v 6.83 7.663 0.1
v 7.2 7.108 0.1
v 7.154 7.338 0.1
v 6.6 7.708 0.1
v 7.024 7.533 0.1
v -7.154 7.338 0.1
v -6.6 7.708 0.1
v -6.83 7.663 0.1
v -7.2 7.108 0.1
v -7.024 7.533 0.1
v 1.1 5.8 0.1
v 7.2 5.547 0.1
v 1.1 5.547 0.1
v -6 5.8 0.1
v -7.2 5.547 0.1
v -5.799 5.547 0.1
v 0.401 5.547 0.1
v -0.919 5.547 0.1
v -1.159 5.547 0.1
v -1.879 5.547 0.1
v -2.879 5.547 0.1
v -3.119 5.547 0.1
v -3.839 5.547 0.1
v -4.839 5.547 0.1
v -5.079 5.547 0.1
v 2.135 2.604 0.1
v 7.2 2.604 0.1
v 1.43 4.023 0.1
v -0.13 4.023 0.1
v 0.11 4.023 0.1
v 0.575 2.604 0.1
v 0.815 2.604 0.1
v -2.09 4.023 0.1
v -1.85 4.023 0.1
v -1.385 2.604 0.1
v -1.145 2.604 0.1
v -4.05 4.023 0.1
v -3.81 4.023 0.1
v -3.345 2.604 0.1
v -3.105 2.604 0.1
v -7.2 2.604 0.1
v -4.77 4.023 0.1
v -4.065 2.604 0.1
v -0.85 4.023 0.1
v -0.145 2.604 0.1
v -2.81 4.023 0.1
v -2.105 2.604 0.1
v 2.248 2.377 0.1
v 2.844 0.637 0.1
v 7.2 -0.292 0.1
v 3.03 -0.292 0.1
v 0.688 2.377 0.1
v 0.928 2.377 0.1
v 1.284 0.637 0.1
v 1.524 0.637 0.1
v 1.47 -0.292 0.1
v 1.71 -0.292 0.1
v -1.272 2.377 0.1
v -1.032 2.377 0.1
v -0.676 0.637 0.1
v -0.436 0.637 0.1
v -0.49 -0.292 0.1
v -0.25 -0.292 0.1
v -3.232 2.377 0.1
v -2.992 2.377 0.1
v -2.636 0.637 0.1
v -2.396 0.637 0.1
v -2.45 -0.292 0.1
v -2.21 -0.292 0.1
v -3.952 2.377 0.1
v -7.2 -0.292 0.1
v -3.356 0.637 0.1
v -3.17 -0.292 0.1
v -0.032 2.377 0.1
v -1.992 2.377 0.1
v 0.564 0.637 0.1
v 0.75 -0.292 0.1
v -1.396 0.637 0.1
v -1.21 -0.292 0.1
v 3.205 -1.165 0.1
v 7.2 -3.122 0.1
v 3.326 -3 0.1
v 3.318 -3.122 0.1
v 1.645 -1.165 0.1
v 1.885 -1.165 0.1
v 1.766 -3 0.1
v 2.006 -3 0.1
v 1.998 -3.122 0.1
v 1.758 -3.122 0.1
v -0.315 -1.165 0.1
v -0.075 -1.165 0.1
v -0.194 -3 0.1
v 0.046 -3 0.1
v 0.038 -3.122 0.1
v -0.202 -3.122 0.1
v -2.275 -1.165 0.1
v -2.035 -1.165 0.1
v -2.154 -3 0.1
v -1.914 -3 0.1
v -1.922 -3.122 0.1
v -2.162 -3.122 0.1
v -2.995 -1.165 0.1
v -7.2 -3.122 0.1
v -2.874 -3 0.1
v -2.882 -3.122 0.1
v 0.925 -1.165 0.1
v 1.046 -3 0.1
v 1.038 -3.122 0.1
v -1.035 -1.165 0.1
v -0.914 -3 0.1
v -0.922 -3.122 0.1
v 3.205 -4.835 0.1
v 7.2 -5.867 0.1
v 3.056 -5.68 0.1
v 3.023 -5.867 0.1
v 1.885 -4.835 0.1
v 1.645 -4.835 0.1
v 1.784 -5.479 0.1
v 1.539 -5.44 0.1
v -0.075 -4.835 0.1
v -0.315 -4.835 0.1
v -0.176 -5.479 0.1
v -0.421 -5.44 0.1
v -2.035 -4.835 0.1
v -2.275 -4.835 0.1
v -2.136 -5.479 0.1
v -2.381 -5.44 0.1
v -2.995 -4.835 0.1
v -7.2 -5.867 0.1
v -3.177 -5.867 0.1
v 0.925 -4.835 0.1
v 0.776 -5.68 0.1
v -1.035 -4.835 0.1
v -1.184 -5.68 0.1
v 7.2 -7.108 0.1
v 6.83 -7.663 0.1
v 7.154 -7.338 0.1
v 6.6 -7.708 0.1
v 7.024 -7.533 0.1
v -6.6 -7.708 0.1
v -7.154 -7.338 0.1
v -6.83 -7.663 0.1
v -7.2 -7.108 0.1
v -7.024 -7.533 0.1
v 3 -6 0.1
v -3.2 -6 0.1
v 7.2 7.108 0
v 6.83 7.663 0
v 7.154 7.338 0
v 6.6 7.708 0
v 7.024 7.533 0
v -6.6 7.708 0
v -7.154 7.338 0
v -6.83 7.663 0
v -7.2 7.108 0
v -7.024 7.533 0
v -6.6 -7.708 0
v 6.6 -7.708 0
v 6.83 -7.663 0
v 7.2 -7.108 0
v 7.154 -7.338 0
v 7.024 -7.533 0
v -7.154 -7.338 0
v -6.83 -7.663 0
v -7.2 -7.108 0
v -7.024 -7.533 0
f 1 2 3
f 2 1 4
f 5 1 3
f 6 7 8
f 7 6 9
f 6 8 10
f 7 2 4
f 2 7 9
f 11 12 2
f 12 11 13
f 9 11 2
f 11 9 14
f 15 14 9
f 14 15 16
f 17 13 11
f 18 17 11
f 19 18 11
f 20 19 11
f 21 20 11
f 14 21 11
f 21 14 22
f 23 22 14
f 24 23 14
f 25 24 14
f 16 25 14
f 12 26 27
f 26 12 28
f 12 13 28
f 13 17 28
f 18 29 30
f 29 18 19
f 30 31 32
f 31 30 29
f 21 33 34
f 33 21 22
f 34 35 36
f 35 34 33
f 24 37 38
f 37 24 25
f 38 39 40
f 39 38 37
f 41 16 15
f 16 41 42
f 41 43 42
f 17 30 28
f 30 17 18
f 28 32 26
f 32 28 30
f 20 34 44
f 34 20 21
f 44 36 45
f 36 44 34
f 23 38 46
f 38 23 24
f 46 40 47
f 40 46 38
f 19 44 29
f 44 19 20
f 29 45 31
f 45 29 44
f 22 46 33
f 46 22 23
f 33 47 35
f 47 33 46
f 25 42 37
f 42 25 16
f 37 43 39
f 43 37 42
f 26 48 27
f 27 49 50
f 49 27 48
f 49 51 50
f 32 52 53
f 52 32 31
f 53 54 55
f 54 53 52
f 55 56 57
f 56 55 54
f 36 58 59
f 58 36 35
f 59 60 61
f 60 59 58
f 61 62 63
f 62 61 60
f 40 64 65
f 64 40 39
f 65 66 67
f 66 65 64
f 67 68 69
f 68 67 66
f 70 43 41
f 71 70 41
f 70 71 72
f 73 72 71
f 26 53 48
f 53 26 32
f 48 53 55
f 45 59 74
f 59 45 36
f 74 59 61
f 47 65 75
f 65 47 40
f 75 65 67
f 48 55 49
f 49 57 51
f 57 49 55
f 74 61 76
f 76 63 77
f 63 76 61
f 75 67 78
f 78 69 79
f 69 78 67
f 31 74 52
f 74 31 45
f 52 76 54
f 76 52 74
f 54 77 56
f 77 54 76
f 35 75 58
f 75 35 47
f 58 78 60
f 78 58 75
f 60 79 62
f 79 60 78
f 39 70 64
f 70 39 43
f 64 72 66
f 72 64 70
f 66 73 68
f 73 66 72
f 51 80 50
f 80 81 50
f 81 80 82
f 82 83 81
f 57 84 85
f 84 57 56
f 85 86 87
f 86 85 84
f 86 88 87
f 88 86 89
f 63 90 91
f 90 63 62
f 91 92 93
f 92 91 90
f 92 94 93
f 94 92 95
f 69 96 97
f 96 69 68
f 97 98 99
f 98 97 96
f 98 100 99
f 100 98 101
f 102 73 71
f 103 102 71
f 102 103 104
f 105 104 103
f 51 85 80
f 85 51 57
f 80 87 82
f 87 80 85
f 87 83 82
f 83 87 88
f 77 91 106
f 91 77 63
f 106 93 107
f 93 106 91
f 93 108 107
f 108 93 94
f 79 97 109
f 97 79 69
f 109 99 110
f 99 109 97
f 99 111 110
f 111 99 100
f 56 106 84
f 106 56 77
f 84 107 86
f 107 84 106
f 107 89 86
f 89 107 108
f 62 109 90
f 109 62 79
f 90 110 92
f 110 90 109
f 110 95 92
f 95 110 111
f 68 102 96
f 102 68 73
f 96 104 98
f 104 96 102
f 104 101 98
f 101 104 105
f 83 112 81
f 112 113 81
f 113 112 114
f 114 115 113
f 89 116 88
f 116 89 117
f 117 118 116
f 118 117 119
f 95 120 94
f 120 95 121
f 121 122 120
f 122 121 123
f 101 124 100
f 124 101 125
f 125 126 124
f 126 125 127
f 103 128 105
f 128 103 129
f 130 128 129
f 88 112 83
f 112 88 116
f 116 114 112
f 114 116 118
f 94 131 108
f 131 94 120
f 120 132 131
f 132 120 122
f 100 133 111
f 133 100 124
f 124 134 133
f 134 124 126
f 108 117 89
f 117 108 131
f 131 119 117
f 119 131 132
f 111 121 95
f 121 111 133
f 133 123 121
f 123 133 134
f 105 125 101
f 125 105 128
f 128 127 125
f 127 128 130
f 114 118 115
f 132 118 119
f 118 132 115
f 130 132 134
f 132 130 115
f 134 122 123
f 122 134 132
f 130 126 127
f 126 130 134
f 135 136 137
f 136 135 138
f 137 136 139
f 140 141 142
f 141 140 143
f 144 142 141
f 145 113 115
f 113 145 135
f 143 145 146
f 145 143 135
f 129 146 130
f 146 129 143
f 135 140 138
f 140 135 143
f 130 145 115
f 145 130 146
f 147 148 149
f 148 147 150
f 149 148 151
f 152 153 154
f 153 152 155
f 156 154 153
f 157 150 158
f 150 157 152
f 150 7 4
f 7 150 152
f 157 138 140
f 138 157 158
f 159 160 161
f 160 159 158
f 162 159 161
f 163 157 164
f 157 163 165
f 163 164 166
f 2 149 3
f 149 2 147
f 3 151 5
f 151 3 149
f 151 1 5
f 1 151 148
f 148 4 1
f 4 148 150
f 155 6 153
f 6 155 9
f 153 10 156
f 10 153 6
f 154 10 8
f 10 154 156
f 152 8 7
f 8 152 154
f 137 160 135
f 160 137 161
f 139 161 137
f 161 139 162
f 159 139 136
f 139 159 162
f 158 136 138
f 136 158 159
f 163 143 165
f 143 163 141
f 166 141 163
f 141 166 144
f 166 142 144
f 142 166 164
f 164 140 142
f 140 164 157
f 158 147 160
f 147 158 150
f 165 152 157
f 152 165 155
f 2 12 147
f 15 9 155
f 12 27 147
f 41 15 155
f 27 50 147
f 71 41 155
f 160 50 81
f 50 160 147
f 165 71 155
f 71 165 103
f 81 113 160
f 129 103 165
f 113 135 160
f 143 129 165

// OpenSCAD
// file: ../p/box3u12.scad
use <../lib.scad>
function ldraw_lib__box3u12() = [
// 0 Box with 3 Parallel Faces without Any Edges
// 0 Name: box3u12.dat
// 0 Author: J.C. Tchang [tchang]
// 0 !LDRAW_ORG Primitive UPDATE 2014-02
// 0 !LICENSE Licensed under CC BY 4.0 : see CAreadme.txt
// 
// 0 BFC CERTIFY CCW
  [0,"BFC","CERTIFY"],
  [0,"BFC","CCW"],
// 
// 0 !HISTORY 2014-12-23 [PTadmin] Official Update 2014-02
// 
// 
// 4 16 -1 1 1 1 1 1 1 1 -1 -1 1 -1
  [4,16,-1,1,1,1,1,1,1,1,-1,-1,1,-1],
// 4 16 -1 1 1 -1 0 1 1 0 1 1 1 1
  [4,16,-1,1,1,-1,0,1,1,0,1,1,1,1],
// 4 16 1 1 -1 1 0 -1 -1 0 -1 -1 1 -1
  [4,16,1,1,-1,1,0,-1,-1,0,-1,-1,1,-1],
];
module ldraw_lib__box3u12(step=0, col=false, unit=2/5, alt=false, line=0.2, solid=!$preview)
    makepoly(ldraw_lib__box3u12(), step=step, col=col, unit=unit, alt=alt, line=line, solid=solid);
ldraw_lib__box3u12(line=0.2);
// file: ../p/1-4cyli.scad
use <../lib.scad>
function ldraw_lib__1_4cyli() = [
// 0 Cylinder 0.25
// 0 Name: 1-4cyli.dat
// 0 Author: James Jessiman
// 0 !LDRAW_ORG Primitive UPDATE 2012-01
// 0 !LICENSE Licensed under CC BY 4.0 : see CAreadme.txt
// 
// 0 BFC CERTIFY CCW
  [0,"BFC","CERTIFY"],
  [0,"BFC","CCW"],
// 
// 0 !HISTORY 2002-03-23 [sbliss] Added BFC statement.
// 0 !HISTORY 2002-04-25 [PTadmin] Official Update 2002-02
// 0 !HISTORY 2007-06-22 [PTadmin] Header formatted for Contributor Agreement
// 0 !HISTORY 2008-07-01 [PTadmin] Official Update 2008-01
// 0 !HISTORY 2012-02-16 [Philo] Changed to CCW
// 0 !HISTORY 2012-03-30 [PTadmin] Official Update 2012-01
// 
// 
// 4 16 1 1 0 0.9239 1 0.3827 0.9239 0 0.3827 1 0 0
  [4,16,1,1,0,0.9239,1,0.3827,0.9239,0,0.3827,1,0,0],
// 5 24 1 0 0 1 1 0 0.9239 0 0.3827 1 0 -1
  [5,24,1,0,0,1,1,0,0.9239,0,0.3827,1,0,-1],
// 4 16 0.9239 1 0.3827 0.7071 1 0.7071 0.7071 0 0.7071 0.9239 0 0.3827
  [4,16,0.9239,1,0.3827,0.7071,1,0.7071,0.7071,0,0.7071,0.9239,0,0.3827],
// 5 24 0.9239 0 0.3827 0.9239 1 0.3827 0.7071 0 0.7071 1 0 0
  [5,24,0.9239,0,0.3827,0.9239,1,0.3827,0.7071,0,0.7071,1,0,0],
// 4 16 0.7071 1 0.7071 0.3827 1 0.9239 0.3827 0 0.9239 0.7071 0 0.7071
  [4,16,0.7071,1,0.7071,0.3827,1,0.9239,0.3827,0,0.9239,0.7071,0,0.7071],
// 5 24 0.7071 0 0.7071 0.7071 1 0.7071 0.3827 0 0.9239 0.9239 0 0.3827
  [5,24,0.7071,0,0.7071,0.7071,1,0.7071,0.3827,0,0.9239,0.9239,0,0.3827],
// 4 16 0.3827 1 0.9239 0 1 1 0 0 1 0.3827 0 0.9239
  [4,16,0.3827,1,0.9239,0,1,1,0,0,1,0.3827,0,0.9239],
// 5 24 0.3827 0 0.9239 0.3827 1 0.9239 0 0 1 0.7071 0 0.7071
  [5,24,0.3827,0,0.9239,0.3827,1,0.9239,0,0,1,0.7071,0,0.7071],
// 5 24 0 0 1 0 1 1 0.3827 0 0.9239 -1 0 1
  [5,24,0,0,1,0,1,1,0.3827,0,0.9239,-1,0,1],
];
module ldraw_lib__1_4cyli(step=0, col=false, unit=2/5, alt=false, line=0.2, solid=!$preview)
    makepoly(ldraw_lib__1_4cyli(), step=step, col=col, unit=unit, alt=alt, line=line, solid=solid);
ldraw_lib__1_4cyli(line=0.2);
// file: ../p/1-4chrd.scad
use <../lib.scad>
function ldraw_lib__1_4chrd() = [
// 0 Chord 0.25
// 0 Name: 1-4chrd.dat
// 0 Author: Max Martin Richter [MMR1988]
// 0 !LDRAW_ORG Primitive UPDATE 2023-05
// 0 !LICENSE Licensed under CC BY 4.0 : see CAreadme.txt
// 
// 0 BFC CERTIFY CCW
  [0,"BFC","CERTIFY"],
  [0,"BFC","CCW"],
// 
// 0 !HISTORY 2004-04-22 [PTadmin] Official Update 2004-02
// 0 !HISTORY 2007-10-09 [PTadmin] Header formatted for Contributor Agreement
// 0 !HISTORY 2008-07-01 [PTadmin] Official Update 2008-01
// 0 !HISTORY 2012-08-02 [MMR1988] Re-creation with PrimGen2 and Rectifier
// 0 !HISTORY 2012-08-09 [PTadmin] Official Update 2012-02
// 0 !HISTORY 2023-10-27 [OrionP] Change author to MMR1988 from hafhead
// 0 !HISTORY 2023-10-31 [OrionP] Official Update 2023-05
// 
// 4 16 0.9239 0 0.3827 0.3827 0 0.9239 0 0 1 1 0 0
  [4,16,0.9239,0,0.3827,0.3827,0,0.9239,0,0,1,1,0,0],
// 3 16 0.7071 0 0.7071 0.3827 0 0.9239 0.9239 0 0.3827
  [3,16,0.7071,0,0.7071,0.3827,0,0.9239,0.9239,0,0.3827],
];
module ldraw_lib__1_4chrd(step=0, col=false, unit=2/5, alt=false, line=0.2, solid=!$preview)
    makepoly(ldraw_lib__1_4chrd(), step=step, col=col, unit=unit, alt=alt, line=line, solid=solid);
ldraw_lib__1_4chrd(line=0.2);
// file: s/6142617ss07.scad
use <../../lib.scad>
use <../../p/1-4chrd.scad>
use <../../p/1-4cyli.scad>
use <../../p/box3u12.scad>
function ldraw_lib__s__6142617ss07() = [
// 0 ~Sticker  1.9 x  1.8 with Silver Air Vents on Black Background Left - Bottom Face
// 0 Name: s\6142617ss07.dat
// 0 Author: Massimo Maso [Sirio]
// 0 !LDRAW_ORG Subpart UPDATE 2023-05
// 0 !LICENSE Licensed under CC BY 4.0 : see CAreadme.txt
// 
// 0 BFC CERTIFY CCW
  [0,"BFC","CERTIFY"],
  [0,"BFC","CCW"],
// 
// 0 !HISTORY 2023-10-31 [OrionP] Official Update 2023-05
// 
// 
// 0 // Primitives
// 1 16 -16.5 0 17.7711 -1.5 0 0 0 -1 0 0 0 1.5 1-4chrd.dat
  [1,16,-16.5,0,17.7711,-1.5,0,0,0,-1,0,0,0,1.5, ldraw_lib__1_4chrd()],
// 1 16 16.5 0 17.7711 1.5 0 0 0 -1 0 0 0 1.5 1-4chrd.dat
  [1,16,16.5,0,17.7711,1.5,0,0,0,-1,0,0,0,1.5, ldraw_lib__1_4chrd()],
// 1 16 0 -.25 0 16.5 0 0 0 .25 0 0 0 19.2711 box3u12.dat
  [1,16,0,-.25,0,16.5,0,0,0,.25,0,0,0,19.2711, ldraw_lib__box3u12()],
// 1 16 -16.5 0 -17.7711 -1.5 0 0 0 -1 0 0 0 -1.5 1-4chrd.dat
  [1,16,-16.5,0,-17.7711,-1.5,0,0,0,-1,0,0,0,-1.5, ldraw_lib__1_4chrd()],
// 1 16 16.5 0 -17.7711 1.5 0 0 0 -1 0 0 0 -1.5 1-4chrd.dat
  [1,16,16.5,0,-17.7711,1.5,0,0,0,-1,0,0,0,-1.5, ldraw_lib__1_4chrd()],
// 1 16 -16.5 -0.25 17.7711 -1.5 0 0 0 0.25 0 0 0 1.5 1-4cyli.dat
  [1,16,-16.5,-0.25,17.7711,-1.5,0,0,0,0.25,0,0,0,1.5, ldraw_lib__1_4cyli()],
// 1 16 16.5 -0.25 17.7711 1.5 0 0 0 0.25 0 0 0 1.5 1-4cyli.dat
  [1,16,16.5,-0.25,17.7711,1.5,0,0,0,0.25,0,0,0,1.5, ldraw_lib__1_4cyli()],
// 1 16 -16.5 -0.25 -17.7711 -1.5 0 0 0 0.25 0 0 0 -1.5 1-4cyli.dat
  [1,16,-16.5,-0.25,-17.7711,-1.5,0,0,0,0.25,0,0,0,-1.5, ldraw_lib__1_4cyli()],
// 1 16 16.5 -0.25 -17.7711 1.5 0 0 0 0.25 0 0 0 -1.5 1-4cyli.dat
  [1,16,16.5,-0.25,-17.7711,1.5,0,0,0,0.25,0,0,0,-1.5, ldraw_lib__1_4cyli()],
// 0 // Bottom face
// 4 16 -16.5 0 19.2711 -16.5 0 -19.2711 -18 0 -17.7711 -18 0 17.7711
  [4,16,-16.5,0,19.2711,-16.5,0,-19.2711,-18,0,-17.7711,-18,0,17.7711],
// 4 16 16.5 0 19.2711 18 0 17.7711 18 0 -17.7711 16.5 0 -19.2711
  [4,16,16.5,0,19.2711,18,0,17.7711,18,0,-17.7711,16.5,0,-19.2711],
// 0 // Lateral face
// 3 16 -18 0 17.7711 -18 -.25 13.8668 -18 -.25 17.7711
  [3,16,-18,0,17.7711,-18,-.25,13.8668,-18,-.25,17.7711],
// 3 16 18 0 17.7711 18 -.25 17.7711 18 -.25 13.8668
  [3,16,18,0,17.7711,18,-.25,17.7711,18,-.25,13.8668],
// 3 16 -18 0 17.7711 -18 -.25 6.5112 -18 -.25 13.8668
  [3,16,-18,0,17.7711,-18,-.25,6.5112,-18,-.25,13.8668],
// 3 16 18 0 17.7711 18 -.25 13.8668 18 -.25 6.5112
  [3,16,18,0,17.7711,18,-.25,13.8668,18,-.25,6.5112],
// 3 16 -18 0 17.7711 -18 -.25 -.73 -18 -.25 6.5112
  [3,16,-18,0,17.7711,-18,-.25,-.73,-18,-.25,6.5112],
// 3 16 18 0 17.7711 18 -.25 6.5112 18 -.25 -.73
  [3,16,18,0,17.7711,18,-.25,6.5112,18,-.25,-.73],
// 4 16 -18 0 17.7711 -18 0 -17.7711 -18 -.25 -7.8038 -18 -.25 -.73
  [4,16,-18,0,17.7711,-18,0,-17.7711,-18,-.25,-7.8038,-18,-.25,-.73],
// 4 16 18 0 17.7711 18 -.25 -.73 18 -.25 -7.8038 18 0 -17.7711
  [4,16,18,0,17.7711,18,-.25,-.73,18,-.25,-7.8038,18,0,-17.7711],
// 3 16 -18 0 -17.7711 -18 -.25 -14.6666 -18 -.25 -7.8038
  [3,16,-18,0,-17.7711,-18,-.25,-14.6666,-18,-.25,-7.8038],
// 3 16 18 0 -17.7711 18 -.25 -7.8038 18 -.25 -14.6666
  [3,16,18,0,-17.7711,18,-.25,-7.8038,18,-.25,-14.6666],
// 3 16 -18 0 -17.7711 -18 -.25 -17.7711 -18 -.25 -14.6666
  [3,16,-18,0,-17.7711,-18,-.25,-17.7711,-18,-.25,-14.6666],
// 3 16 18 0 -17.7711 18 -.25 -14.6666 18 -.25 -17.7711
  [3,16,18,0,-17.7711,18,-.25,-14.6666,18,-.25,-17.7711],
];
module ldraw_lib__s__6142617ss07(step=0, col=false, unit=2/5, alt=false, line=0.2, solid=!$preview)
    makepoly(ldraw_lib__s__6142617ss07(), step=step, col=col, unit=unit, alt=alt, line=line, solid=solid);
ldraw_lib__s__6142617ss07(line=0.2);
// file: s/6142617ss06.scad
use <../../lib.scad>
use <../../p/1-4chrd.scad>
function ldraw_lib__s__6142617ss06() = [
// 0 ~Sticker  1.9 x  1.8 with Silver Air Vents on Black Background Left - Sixth Face
// 0 Name: s\6142617ss06.dat
// 0 Author: Massimo Maso [Sirio]
// 0 !LDRAW_ORG Subpart UPDATE 2023-05
// 0 !LICENSE Licensed under CC BY 4.0 : see CAreadme.txt
// 
// 0 BFC CERTIFY CCW
  [0,"BFC","CERTIFY"],
  [0,"BFC","CCW"],
// 
// 0 !HISTORY 2023-10-31 [OrionP] Official Update 2023-05
// 
// 
// 0 // Primitives
// 1 0 -16.5 -.25 -3.0901 -1.5 0 0 0 1 0 0 0 -1.5 1-4chrd.dat
  [1,0,-16.5,-.25,-3.0901,-1.5,0,0,0,1,0,0,0,-1.5, ldraw_lib__1_4chrd()],
// 1 0 16.5 -.25 -3.0901 1.5 0 0 0 1 0 0 0 -1.5 1-4chrd.dat
  [1,0,16.5,-.25,-3.0901,1.5,0,0,0,1,0,0,0,-1.5, ldraw_lib__1_4chrd()],
// 0 // Black faces
// 4 0 -18 -.25 -3.0901 -7.5 -.25 -.319 -7.5587 -.25 .0144 -18 -.25 .0144
  [4,0,-18,-.25,-3.0901,-7.5,-.25,-.319,-7.5587,-.25,.0144,-18,-.25,.0144],
// 4 0 -18 -.25 -3.0901 18 -.25 -3.0901 8 -.25 -.319 -7.5 -.25 -.319
  [4,0,-18,-.25,-3.0901,18,-.25,-3.0901,8,-.25,-.319,-7.5,-.25,-.319],
// 4 0 18 -.25 -3.0901 18 -.25 .0144 7.9413 -.25 .0144 8 -.25 -.319
  [4,0,18,-.25,-3.0901,18,-.25,.0144,7.9413,-.25,.0144,8,-.25,-.319],
// 4 0 18 -.25 -3.0901 -18 -.25 -3.0901 -16.5 -.25 -4.5901 16.5 -.25 -4.5901
  [4,0,18,-.25,-3.0901,-18,-.25,-3.0901,-16.5,-.25,-4.5901,16.5,-.25,-4.5901],
// 0 // Silver face
// 4 80 -7.5587 -.25 .0144 -7.5 -.25 -.319 8 -.25 -.319 7.9413 -.25 .0144
  [4,80,-7.5587,-.25,.0144,-7.5,-.25,-.319,8,-.25,-.319,7.9413,-.25,.0144],
];
module ldraw_lib__s__6142617ss06(step=0, col=false, unit=2/5, alt=false, line=0.2, solid=!$preview)
    makepoly(ldraw_lib__s__6142617ss06(), step=step, col=col, unit=unit, alt=alt, line=line, solid=solid);
ldraw_lib__s__6142617ss06(line=0.2);
// file: s/6142617ss05.scad
use <../../lib.scad>
function ldraw_lib__s__6142617ss05() = [
// 0 ~Sticker  1.9 x  1.8 with Silver Air Vents on Black Background Left - Fifth Face
// 0 Name: s\6142617ss05.dat
// 0 Author: Massimo Maso [Sirio]
// 0 !LDRAW_ORG Subpart UPDATE 2023-05
// 0 !LICENSE Licensed under CC BY 4.0 : see CAreadme.txt
// 
// 0 BFC CERTIFY CCW
  [0,"BFC","CERTIFY"],
  [0,"BFC","CCW"],
// 
// 0 !HISTORY 2023-10-31 [OrionP] Official Update 2023-05
// 
// 
// 0 // Black faces
// 3 0 -18 -.25 6.8484 -8.0132 -.25 2.5659 -8.2961 -.25 6.8484
  [3,0,-18,-.25,6.8484,-8.0132,-.25,2.5659,-8.2961,-.25,6.8484],
// 4 0 -18 -.25 6.8484 -18 -.25 -.0144 -7.6409 -.25 .4522 -8.0132 -.25 2.5659
  [4,0,-18,-.25,6.8484,-18,-.25,-.0144,-7.6409,-.25,.4522,-8.0132,-.25,2.5659],
// 3 0 -18 -.25 -.0144 -7.5587 -.25 -.0144 -7.6409 -.25 .4522
  [3,0,-18,-.25,-.0144,-7.5587,-.25,-.0144,-7.6409,-.25,.4522],
// 4 0 -4.7132 -.25 2.5659 -4.1132 -.25 2.5659 -4.3961 -.25 6.8484 -4.9961 -.25 6.8484
  [4,0,-4.7132,-.25,2.5659,-4.1132,-.25,2.5659,-4.3961,-.25,6.8484,-4.9961,-.25,6.8484],
// 4 0 -4.7132 -.25 2.5659 -4.461 -.25 .955 -3.8466 -.25 1.0522 -4.1132 -.25 2.5659
  [4,0,-4.7132,-.25,2.5659,-4.461,-.25,.955,-3.8466,-.25,1.0522,-4.1132,-.25,2.5659],
// 4 0 .1868 -.25 2.5659 .7868 -.25 2.5659 .5039 -.25 6.8484 -.0961 -.25 6.8484
  [4,0,.1868,-.25,2.5659,.7868,-.25,2.5659,.5039,-.25,6.8484,-.0961,-.25,6.8484],
// 4 0 .1868 -.25 2.5659 .439 -.25 .955 1.0534 -.25 1.0522 .7868 -.25 2.5659
  [4,0,.1868,-.25,2.5659,.439,-.25,.955,1.0534,-.25,1.0522,.7868,-.25,2.5659],
// 4 0 5.0868 -.25 2.5659 5.6868 -.25 2.5659 5.4039 -.25 6.8484 4.8039 -.25 6.8484
  [4,0,5.0868,-.25,2.5659,5.6868,-.25,2.5659,5.4039,-.25,6.8484,4.8039,-.25,6.8484],
// 4 0 5.0868 -.25 2.5659 5.339 -.25 .955 5.9534 -.25 1.0522 5.6868 -.25 2.5659
  [4,0,5.0868,-.25,2.5659,5.339,-.25,.955,5.9534,-.25,1.0522,5.6868,-.25,2.5659],
// 4 0 18 -.25 -.0144 18 -.25 6.8484 7.2039 -.25 6.8484 7.4868 -.25 2.5659
  [4,0,18,-.25,-.0144,18,-.25,6.8484,7.2039,-.25,6.8484,7.4868,-.25,2.5659],
// 3 0 18 -.25 -.0144 7.4868 -.25 2.5659 7.9413 -.25 -.0144
  [3,0,18,-.25,-.0144,7.4868,-.25,2.5659,7.9413,-.25,-.0144],
// 0 // Grey faces
// 4 71 -8.0132 -.25 2.5659 -4.7132 -.25 2.5659 -4.9961 -.25 6.8484 -8.2961 -.25 6.8484
  [4,71,-8.0132,-.25,2.5659,-4.7132,-.25,2.5659,-4.9961,-.25,6.8484,-8.2961,-.25,6.8484],
// 4 71 -8.0132 -.25 2.5659 -7.6409 -.25 .4522 -4.461 -.25 .955 -4.7132 -.25 2.5659
  [4,71,-8.0132,-.25,2.5659,-7.6409,-.25,.4522,-4.461,-.25,.955,-4.7132,-.25,2.5659],
// 4 71 -2.3132 -.25 2.5659 .1868 -.25 2.5659 -.0961 -.25 6.8484 -2.5961 -.25 6.8484
  [4,71,-2.3132,-.25,2.5659,.1868,-.25,2.5659,-.0961,-.25,6.8484,-2.5961,-.25,6.8484],
// 4 71 -2.3132 -.25 2.5659 -1.9409 -.25 .4522 .439 -.25 .955 .1868 -.25 2.5659
  [4,71,-2.3132,-.25,2.5659,-1.9409,-.25,.4522,.439,-.25,.955,.1868,-.25,2.5659],
// 4 71 2.5868 -.25 2.5659 5.0868 -.25 2.5659 4.8039 -.25 6.8484 2.3039 -.25 6.8484
  [4,71,2.5868,-.25,2.5659,5.0868,-.25,2.5659,4.8039,-.25,6.8484,2.3039,-.25,6.8484],
// 4 71 2.5868 -.25 2.5659 2.9591 -.25 .4522 5.339 -.25 .955 5.0868 -.25 2.5659
  [4,71,2.5868,-.25,2.5659,2.9591,-.25,.4522,5.339,-.25,.955,5.0868,-.25,2.5659],
// 0 // Silver faces
// 4 80 -4.1132 -.25 2.5659 -2.3132 -.25 2.5659 -2.5961 -.25 6.8484 -4.3961 -.25 6.8484
  [4,80,-4.1132,-.25,2.5659,-2.3132,-.25,2.5659,-2.5961,-.25,6.8484,-4.3961,-.25,6.8484],
// 4 80 -4.1132 -.25 2.5659 -3.8466 -.25 1.0522 -1.9409 -.25 .4522 -2.3132 -.25 2.5659
  [4,80,-4.1132,-.25,2.5659,-3.8466,-.25,1.0522,-1.9409,-.25,.4522,-2.3132,-.25,2.5659],
// 4 80 .7868 -.25 2.5659 2.5868 -.25 2.5659 2.3039 -.25 6.8484 .5039 -.25 6.8484
  [4,80,.7868,-.25,2.5659,2.5868,-.25,2.5659,2.3039,-.25,6.8484,.5039,-.25,6.8484],
// 4 80 .7868 -.25 2.5659 1.0534 -.25 1.0522 2.9591 -.25 .4522 2.5868 -.25 2.5659
  [4,80,.7868,-.25,2.5659,1.0534,-.25,1.0522,2.9591,-.25,.4522,2.5868,-.25,2.5659],
// 4 80 5.6868 -.25 2.5659 7.4868 -.25 2.5659 7.2039 -.25 6.8484 5.4039 -.25 6.8484
  [4,80,5.6868,-.25,2.5659,7.4868,-.25,2.5659,7.2039,-.25,6.8484,5.4039,-.25,6.8484],
// 4 80 5.6868 -.25 2.5659 5.9534 -.25 1.0522 7.9413 -.25 -.0144 7.4868 -.25 2.5659
  [4,80,5.6868,-.25,2.5659,5.9534,-.25,1.0522,7.9413,-.25,-.0144,7.4868,-.25,2.5659],
// 3 80 -7.5587 -.25 -.0144 -4.461 -.25 .955 -7.6409 -.25 .4522
  [3,80,-7.5587,-.25,-.0144,-4.461,-.25,.955,-7.6409,-.25,.4522],
// 4 80 -7.5587 -.25 -.0144 -1.9409 -.25 .4522 -3.8466 -.25 1.0522 -4.461 -.25 .955
  [4,80,-7.5587,-.25,-.0144,-1.9409,-.25,.4522,-3.8466,-.25,1.0522,-4.461,-.25,.955],
// 4 80 -7.5587 -.25 -.0144 7.9413 -.25 -.0144 2.9591 -.25 .4522 -1.9409 -.25 .4522
  [4,80,-7.5587,-.25,-.0144,7.9413,-.25,-.0144,2.9591,-.25,.4522,-1.9409,-.25,.4522],
// 4 80 2.9591 -.25 .4522 1.0534 -.25 1.0522 .439 -.25 .955 -1.9409 -.25 .4522
  [4,80,2.9591,-.25,.4522,1.0534,-.25,1.0522,.439,-.25,.955,-1.9409,-.25,.4522],
// 4 80 2.9591 -.25 .4522 7.9413 -.25 -.0144 5.9534 -.25 1.0522 5.339 -.25 .955
  [4,80,2.9591,-.25,.4522,7.9413,-.25,-.0144,5.9534,-.25,1.0522,5.339,-.25,.955],
];
module ldraw_lib__s__6142617ss05(step=0, col=false, unit=2/5, alt=false, line=0.2, solid=!$preview)
    makepoly(ldraw_lib__s__6142617ss05(), step=step, col=col, unit=unit, alt=alt, line=line, solid=solid);
ldraw_lib__s__6142617ss05(line=0.2);
// file: s/6142617ss04.scad
use <../../lib.scad>
function ldraw_lib__s__6142617ss04() = [
// 0 ~Sticker  1.9 x  1.8 with Silver Air Vents on Black Background Left - Fourth Face
// 0 Name: s\6142617ss04.dat
// 0 Author: Massimo Maso [Sirio]
// 0 !LDRAW_ORG Subpart UPDATE 2023-05
// 0 !LICENSE Licensed under CC BY 4.0 : see CAreadme.txt
// 
// 0 BFC CERTIFY CCW
  [0,"BFC","CERTIFY"],
  [0,"BFC","CCW"],
// 
// 0 !HISTORY 2023-10-31 [OrionP] Official Update 2023-05
// 
// 
// 0 // Black faces
// 3 0 -18 -.25 .0128 -8.0132 -.25 -2.1709 -7.5754 -.25 .0128
  [3,0,-18,-.25,.0128,-8.0132,-.25,-2.1709,-7.5754,-.25,.0128],
// 4 0 -18 -.25 .0128 -18 -.25 -7.061 -8.3161 -.25 -6.7572 -8.0132 -.25 -2.1709
  [4,0,-18,-.25,.0128,-18,-.25,-7.061,-8.3161,-.25,-6.7572,-8.0132,-.25,-2.1709],
// 3 0 -18 -.25 -7.061 -8.2961 -.25 -7.061 -8.3161 -.25 -6.7572
  [3,0,-18,-.25,-7.061,-8.2961,-.25,-7.061,-8.3161,-.25,-6.7572],
// 4 0 -4.7132 -.25 -2.1709 -4.1132 -.25 -2.1709 -3.6754 -.25 .0128 -4.2754 -.25 .0128
  [4,0,-4.7132,-.25,-2.1709,-4.1132,-.25,-2.1709,-3.6754,-.25,.0128,-4.2754,-.25,.0128],
// 4 0 -4.7132 -.25 -2.1709 -5.0161 -.25 -6.7572 -4.4161 -.25 -6.7572 -4.1132 -.25 -2.1709
  [4,0,-4.7132,-.25,-2.1709,-5.0161,-.25,-6.7572,-4.4161,-.25,-6.7572,-4.1132,-.25,-2.1709],
// 4 0 -5.0161 -.25 -6.7572 -4.9961 -.25 -7.061 -4.3961 -.25 -7.061 -4.4161 -.25 -6.7572
  [4,0,-5.0161,-.25,-6.7572,-4.9961,-.25,-7.061,-4.3961,-.25,-7.061,-4.4161,-.25,-6.7572],
// 4 0 .1868 -.25 -2.1709 .7868 -.25 -2.1709 1.2246 -.25 .0128 .6246 -.25 .0128
  [4,0,.1868,-.25,-2.1709,.7868,-.25,-2.1709,1.2246,-.25,.0128,.6246,-.25,.0128],
// 4 0 .1868 -.25 -2.1709 -.1161 -.25 -6.7572 .4839 -.25 -6.7572 .7868 -.25 -2.1709
  [4,0,.1868,-.25,-2.1709,-.1161,-.25,-6.7572,.4839,-.25,-6.7572,.7868,-.25,-2.1709],
// 4 0 -.1161 -.25 -6.7572 -.0961 -.25 -7.061 .5039 -.25 -7.061 .4839 -.25 -6.7572
  [4,0,-.1161,-.25,-6.7572,-.0961,-.25,-7.061,.5039,-.25,-7.061,.4839,-.25,-6.7572],
// 4 0 5.0868 -.25 -2.1709 5.6868 -.25 -2.1709 6.1246 -.25 .0128 5.5246 -.25 .0128
  [4,0,5.0868,-.25,-2.1709,5.6868,-.25,-2.1709,6.1246,-.25,.0128,5.5246,-.25,.0128],
// 4 0 5.0868 -.25 -2.1709 4.7839 -.25 -6.7572 5.3839 -.25 -6.7572 5.6868 -.25 -2.1709
  [4,0,5.0868,-.25,-2.1709,4.7839,-.25,-6.7572,5.3839,-.25,-6.7572,5.6868,-.25,-2.1709],
// 4 0 4.7839 -.25 -6.7572 4.8039 -.25 -7.061 5.4039 -.25 -7.061 5.3839 -.25 -6.7572
  [4,0,4.7839,-.25,-6.7572,4.8039,-.25,-7.061,5.4039,-.25,-7.061,5.3839,-.25,-6.7572],
// 3 0 18 -.25 .0128 7.9246 -.25 .0128 7.4868 -.25 -2.1709
  [3,0,18,-.25,.0128,7.9246,-.25,.0128,7.4868,-.25,-2.1709],
// 4 0 18 -.25 -7.061 18 -.25 .0128 7.4868 -.25 -2.1709 7.1839 -.25 -6.7572
  [4,0,18,-.25,-7.061,18,-.25,.0128,7.4868,-.25,-2.1709,7.1839,-.25,-6.7572],
// 3 0 18 -.25 -7.061 7.1839 -.25 -6.7572 7.2039 -.25 -7.061
  [3,0,18,-.25,-7.061,7.1839,-.25,-6.7572,7.2039,-.25,-7.061],
// 0 // Grey faces
// 4 71 -8.0132 -.25 -2.1709 -4.7132 -.25 -2.1709 -4.2754 -.25 .0128 -7.5754 -.25 .0128
  [4,71,-8.0132,-.25,-2.1709,-4.7132,-.25,-2.1709,-4.2754,-.25,.0128,-7.5754,-.25,.0128],
// 4 71 -8.0132 -.25 -2.1709 -8.3161 -.25 -6.7572 -5.0161 -.25 -6.7572 -4.7132 -.25 -2.1709
  [4,71,-8.0132,-.25,-2.1709,-8.3161,-.25,-6.7572,-5.0161,-.25,-6.7572,-4.7132,-.25,-2.1709],
// 4 71 -8.3161 -.25 -6.7572 -8.2961 -.25 -7.061 -4.9961 -.25 -7.061 -5.0161 -.25 -6.7572
  [4,71,-8.3161,-.25,-6.7572,-8.2961,-.25,-7.061,-4.9961,-.25,-7.061,-5.0161,-.25,-6.7572],
// 4 71 -2.3132 -.25 -2.1709 .1868 -.25 -2.1709 .6246 -.25 .0128 -1.8754 -.25 .0128
  [4,71,-2.3132,-.25,-2.1709,.1868,-.25,-2.1709,.6246,-.25,.0128,-1.8754,-.25,.0128],
// 4 71 -2.3132 -.25 -2.1709 -2.6161 -.25 -6.7572 -.1161 -.25 -6.7572 .1868 -.25 -2.1709
  [4,71,-2.3132,-.25,-2.1709,-2.6161,-.25,-6.7572,-.1161,-.25,-6.7572,.1868,-.25,-2.1709],
// 4 71 -2.6161 -.25 -6.7572 -2.5961 -.25 -7.061 -.0961 -.25 -7.061 -.1161 -.25 -6.7572
  [4,71,-2.6161,-.25,-6.7572,-2.5961,-.25,-7.061,-.0961,-.25,-7.061,-.1161,-.25,-6.7572],
// 4 71 2.5868 -.25 -2.1709 5.0868 -.25 -2.1709 5.5246 -.25 .0128 3.0246 -.25 .0128
  [4,71,2.5868,-.25,-2.1709,5.0868,-.25,-2.1709,5.5246,-.25,.0128,3.0246,-.25,.0128],
// 4 71 2.5868 -.25 -2.1709 2.2839 -.25 -6.7572 4.7839 -.25 -6.7572 5.0868 -.25 -2.1709
  [4,71,2.5868,-.25,-2.1709,2.2839,-.25,-6.7572,4.7839,-.25,-6.7572,5.0868,-.25,-2.1709],
// 4 71 2.2839 -.25 -6.7572 2.3039 -.25 -7.061 4.8039 -.25 -7.061 4.7839 -.25 -6.7572
  [4,71,2.2839,-.25,-6.7572,2.3039,-.25,-7.061,4.8039,-.25,-7.061,4.7839,-.25,-6.7572],
// 0 // Silver faces
// 4 80 -4.1132 -.25 -2.1709 -2.3132 -.25 -2.1709 -1.8754 -.25 .0128 -3.6754 -.25 .0128
  [4,80,-4.1132,-.25,-2.1709,-2.3132,-.25,-2.1709,-1.8754,-.25,.0128,-3.6754,-.25,.0128],
// 4 80 -4.1132 -.25 -2.1709 -4.4161 -.25 -6.7572 -2.6161 -.25 -6.7572 -2.3132 -.25 -2.1709
  [4,80,-4.1132,-.25,-2.1709,-4.4161,-.25,-6.7572,-2.6161,-.25,-6.7572,-2.3132,-.25,-2.1709],
// 4 80 -4.4161 -.25 -6.7572 -4.3961 -.25 -7.061 -2.5961 -.25 -7.061 -2.6161 -.25 -6.7572
  [4,80,-4.4161,-.25,-6.7572,-4.3961,-.25,-7.061,-2.5961,-.25,-7.061,-2.6161,-.25,-6.7572],
// 4 80 .7868 -.25 -2.1709 2.5868 -.25 -2.1709 3.0246 -.25 .0128 1.2246 -.25 .0128
  [4,80,.7868,-.25,-2.1709,2.5868,-.25,-2.1709,3.0246,-.25,.0128,1.2246,-.25,.0128],
// 4 80 .7868 -.25 -2.1709 .4839 -.25 -6.7572 2.2839 -.25 -6.7572 2.5868 -.25 -2.1709
  [4,80,.7868,-.25,-2.1709,.4839,-.25,-6.7572,2.2839,-.25,-6.7572,2.5868,-.25,-2.1709],
// 4 80 .4839 -.25 -6.7572 .5039 -.25 -7.061 2.3039 -.25 -7.061 2.2839 -.25 -6.7572
  [4,80,.4839,-.25,-6.7572,.5039,-.25,-7.061,2.3039,-.25,-7.061,2.2839,-.25,-6.7572],
// 4 80 5.6868 -.25 -2.1709 7.4868 -.25 -2.1709 7.9246 -.25 .0128 6.1246 -.25 .0128
  [4,80,5.6868,-.25,-2.1709,7.4868,-.25,-2.1709,7.9246,-.25,.0128,6.1246,-.25,.0128],
// 4 80 5.6868 -.25 -2.1709 5.3839 -.25 -6.7572 7.1839 -.25 -6.7572 7.4868 -.25 -2.1709
  [4,80,5.6868,-.25,-2.1709,5.3839,-.25,-6.7572,7.1839,-.25,-6.7572,7.4868,-.25,-2.1709],
// 4 80 5.3839 -.25 -6.7572 5.4039 -.25 -7.061 7.2039 -.25 -7.061 7.1839 -.25 -6.7572
  [4,80,5.3839,-.25,-6.7572,5.4039,-.25,-7.061,7.2039,-.25,-7.061,7.1839,-.25,-6.7572],
];
module ldraw_lib__s__6142617ss04(step=0, col=false, unit=2/5, alt=false, line=0.2, solid=!$preview)
    makepoly(ldraw_lib__s__6142617ss04(), step=step, col=col, unit=unit, alt=alt, line=line, solid=solid);
ldraw_lib__s__6142617ss04(line=0.2);
// file: s/6142617ss03.scad
use <../../lib.scad>
function ldraw_lib__s__6142617ss03() = [
// 0 ~Sticker  1.9 x  1.8 with Silver Air Vents on Black Background Left - Third Face
// 0 Name: s\6142617ss03.dat
// 0 Author: Massimo Maso [Sirio]
// 0 !LDRAW_ORG Subpart UPDATE 2023-05
// 0 !LICENSE Licensed under CC BY 4.0 : see CAreadme.txt
// 
// 0 BFC CERTIFY CCW
  [0,"BFC","CERTIFY"],
  [0,"BFC","CCW"],
// 
// 0 !HISTORY 2023-10-31 [OrionP] Official Update 2023-05
// 
// 
// 0 // Black faces
// 3 0 -18 -.25 7.2284 -5.6212 -.25 6.6588 -5.3378 -.25 7.2284
  [3,0,-18,-.25,7.2284,-5.6212,-.25,6.6588,-5.3378,-.25,7.2284],
// 4 0 -18 -.25 7.2284 -18 -.25 -.0128 -7.1097 -.25 2.3102 -5.6212 -.25 6.6588
  [4,0,-18,-.25,7.2284,-18,-.25,-.0128,-7.1097,-.25,2.3102,-5.6212,-.25,6.6588],
// 3 0 -18 -.25 -.0128 -7.5754 -.25 -.0128 -7.1097 -.25 2.3102
  [3,0,-18,-.25,-.0128,-7.5754,-.25,-.0128,-7.1097,-.25,2.3102],
// 4 0 -2.3212 -.25 6.6588 -1.7212 -.25 6.6588 -1.4378 -.25 7.2284 -2.0378 -.25 7.2284
  [4,0,-2.3212,-.25,6.6588,-1.7212,-.25,6.6588,-1.4378,-.25,7.2284,-2.0378,-.25,7.2284],
// 4 0 -2.3212 -.25 6.6588 -3.8097 -.25 2.3102 -3.2097 -.25 2.3102 -1.7212 -.25 6.6588
  [4,0,-2.3212,-.25,6.6588,-3.8097,-.25,2.3102,-3.2097,-.25,2.3102,-1.7212,-.25,6.6588],
// 4 0 -3.8097 -.25 2.3102 -4.2754 -.25 -.0128 -3.6754 -.25 -.0128 -3.2097 -.25 2.3102
  [4,0,-3.8097,-.25,2.3102,-4.2754,-.25,-.0128,-3.6754,-.25,-.0128,-3.2097,-.25,2.3102],
// 4 0 2.5788 -.25 6.6588 3.1788 -.25 6.6588 3.4622 -.25 7.2284 2.8622 -.25 7.2284
  [4,0,2.5788,-.25,6.6588,3.1788,-.25,6.6588,3.4622,-.25,7.2284,2.8622,-.25,7.2284],
// 4 0 2.5788 -.25 6.6588 1.0903 -.25 2.3102 1.6903 -.25 2.3102 3.1788 -.25 6.6588
  [4,0,2.5788,-.25,6.6588,1.0903,-.25,2.3102,1.6903,-.25,2.3102,3.1788,-.25,6.6588],
// 4 0 1.0903 -.25 2.3102 .6246 -.25 -.0128 1.2246 -.25 -.0128 1.6903 -.25 2.3102
  [4,0,1.0903,-.25,2.3102,.6246,-.25,-.0128,1.2246,-.25,-.0128,1.6903,-.25,2.3102],
// 4 0 7.4788 -.25 6.6588 8.0788 -.25 6.6588 8.3622 -.25 7.2284 7.7622 -.25 7.2284
  [4,0,7.4788,-.25,6.6588,8.0788,-.25,6.6588,8.3622,-.25,7.2284,7.7622,-.25,7.2284],
// 4 0 7.4788 -.25 6.6588 5.9903 -.25 2.3102 6.5903 -.25 2.3102 8.0788 -.25 6.6588
  [4,0,7.4788,-.25,6.6588,5.9903,-.25,2.3102,6.5903,-.25,2.3102,8.0788,-.25,6.6588],
// 4 0 5.9903 -.25 2.3102 5.5246 -.25 -.0128 6.1246 -.25 -.0128 6.5903 -.25 2.3102
  [4,0,5.9903,-.25,2.3102,5.5246,-.25,-.0128,6.1246,-.25,-.0128,6.5903,-.25,2.3102],
// 3 0 18 -.25 7.2284 10.1622 -.25 7.2284 9.8788 -.25 6.6588
  [3,0,18,-.25,7.2284,10.1622,-.25,7.2284,9.8788,-.25,6.6588],
// 4 0 18 -.25 -.0128 18 -.25 7.2284 9.8788 -.25 6.6588 8.3903 -.25 2.3102
  [4,0,18,-.25,-.0128,18,-.25,7.2284,9.8788,-.25,6.6588,8.3903,-.25,2.3102],
// 3 0 18 -.25 -.0128 8.3903 -.25 2.3102 7.9246 -.25 -.0128
  [3,0,18,-.25,-.0128,8.3903,-.25,2.3102,7.9246,-.25,-.0128],
// 0 // Dark grey faces
// 4 72 -5.6212 -.25 6.6588 -2.3212 -.25 6.6588 -2.0378 -.25 7.2284 -5.3378 -.25 7.2284
  [4,72,-5.6212,-.25,6.6588,-2.3212,-.25,6.6588,-2.0378,-.25,7.2284,-5.3378,-.25,7.2284],
// 3 72 -3.8097 -.25 2.3102 -2.3212 -.25 6.6588 -5.6212 -.25 6.6588
  [3,72,-3.8097,-.25,2.3102,-2.3212,-.25,6.6588,-5.6212,-.25,6.6588],
// 4 72 .0788 -.25 6.6588 2.5788 -.25 6.6588 2.8622 -.25 7.2284 .3622 -.25 7.2284
  [4,72,.0788,-.25,6.6588,2.5788,-.25,6.6588,2.8622,-.25,7.2284,.3622,-.25,7.2284],
// 3 72 1.0903 -.25 2.3102 2.5788 -.25 6.6588 .0788 -.25 6.6588
  [3,72,1.0903,-.25,2.3102,2.5788,-.25,6.6588,.0788,-.25,6.6588],
// 4 72 4.9788 -.25 6.6588 7.4788 -.25 6.6588 7.7622 -.25 7.2284 5.2622 -.25 7.2284
  [4,72,4.9788,-.25,6.6588,7.4788,-.25,6.6588,7.7622,-.25,7.2284,5.2622,-.25,7.2284],
// 3 72 5.9903 -.25 2.3102 7.4788 -.25 6.6588 4.9788 -.25 6.6588
  [3,72,5.9903,-.25,2.3102,7.4788,-.25,6.6588,4.9788,-.25,6.6588],
// 0 // Grey faces
// 3 71 -7.1097 -.25 2.3102 -3.8097 -.25 2.3102 -5.6212 -.25 6.6588
  [3,71,-7.1097,-.25,2.3102,-3.8097,-.25,2.3102,-5.6212,-.25,6.6588],
// 4 71 -7.1097 -.25 2.3102 -7.5754 -.25 -.0128 -4.2754 -.25 -.0128 -3.8097 -.25 2.3102
  [4,71,-7.1097,-.25,2.3102,-7.5754,-.25,-.0128,-4.2754,-.25,-.0128,-3.8097,-.25,2.3102],
// 3 71 -1.4097 -.25 2.3102 1.0903 -.25 2.3102 .0788 -.25 6.6588
  [3,71,-1.4097,-.25,2.3102,1.0903,-.25,2.3102,.0788,-.25,6.6588],
// 4 71 -1.4097 -.25 2.3102 -1.8754 -.25 -.0128 .6246 -.25 -.0128 1.0903 -.25 2.3102
  [4,71,-1.4097,-.25,2.3102,-1.8754,-.25,-.0128,.6246,-.25,-.0128,1.0903,-.25,2.3102],
// 3 71 3.4903 -.25 2.3102 5.9903 -.25 2.3102 4.9788 -.25 6.6588
  [3,71,3.4903,-.25,2.3102,5.9903,-.25,2.3102,4.9788,-.25,6.6588],
// 4 71 3.4903 -.25 2.3102 3.0246 -.25 -.0128 5.5246 -.25 -.0128 5.9903 -.25 2.3102
  [4,71,3.4903,-.25,2.3102,3.0246,-.25,-.0128,5.5246,-.25,-.0128,5.9903,-.25,2.3102],
// 0 // Silver faces
// 4 80 -1.7212 -.25 6.6588 .0788 -.25 6.6588 .3622 -.25 7.2284 -1.4378 -.25 7.2284
  [4,80,-1.7212,-.25,6.6588,.0788,-.25,6.6588,.3622,-.25,7.2284,-1.4378,-.25,7.2284],
// 4 80 -1.7212 -.25 6.6588 -3.2097 -.25 2.3102 -1.4097 -.25 2.3102 .0788 -.25 6.6588
  [4,80,-1.7212,-.25,6.6588,-3.2097,-.25,2.3102,-1.4097,-.25,2.3102,.0788,-.25,6.6588],
// 4 80 -3.2097 -.25 2.3102 -3.6754 -.25 -.0128 -1.8754 -.25 -.0128 -1.4097 -.25 2.3102
  [4,80,-3.2097,-.25,2.3102,-3.6754,-.25,-.0128,-1.8754,-.25,-.0128,-1.4097,-.25,2.3102],
// 4 80 3.1788 -.25 6.6588 4.9788 -.25 6.6588 5.2622 -.25 7.2284 3.4622 -.25 7.2284
  [4,80,3.1788,-.25,6.6588,4.9788,-.25,6.6588,5.2622,-.25,7.2284,3.4622,-.25,7.2284],
// 4 80 3.1788 -.25 6.6588 1.6903 -.25 2.3102 3.4903 -.25 2.3102 4.9788 -.25 6.6588
  [4,80,3.1788,-.25,6.6588,1.6903,-.25,2.3102,3.4903,-.25,2.3102,4.9788,-.25,6.6588],
// 4 80 1.6903 -.25 2.3102 1.2246 -.25 -.0128 3.0246 -.25 -.0128 3.4903 -.25 2.3102
  [4,80,1.6903,-.25,2.3102,1.2246,-.25,-.0128,3.0246,-.25,-.0128,3.4903,-.25,2.3102],
// 4 80 8.0788 -.25 6.6588 9.8788 -.25 6.6588 10.1622 -.25 7.2284 8.3622 -.25 7.2284
  [4,80,8.0788,-.25,6.6588,9.8788,-.25,6.6588,10.1622,-.25,7.2284,8.3622,-.25,7.2284],
// 4 80 8.0788 -.25 6.6588 6.5903 -.25 2.3102 8.3903 -.25 2.3102 9.8788 -.25 6.6588
  [4,80,8.0788,-.25,6.6588,6.5903,-.25,2.3102,8.3903,-.25,2.3102,9.8788,-.25,6.6588],
// 4 80 6.5903 -.25 2.3102 6.1246 -.25 -.0128 7.9246 -.25 -.0128 8.3903 -.25 2.3102
  [4,80,6.5903,-.25,2.3102,6.1246,-.25,-.0128,7.9246,-.25,-.0128,8.3903,-.25,2.3102],
];
module ldraw_lib__s__6142617ss03(step=0, col=false, unit=2/5, alt=false, line=0.2, solid=!$preview)
    makepoly(ldraw_lib__s__6142617ss03(), step=step, col=col, unit=unit, alt=alt, line=line, solid=solid);
ldraw_lib__s__6142617ss03(line=0.2);
// file: s/6142617ss02.scad
use <../../lib.scad>
function ldraw_lib__s__6142617ss02() = [
// 0 ~Sticker  1.9 x  1.8 with Silver Air Vents on Black Background Left - Second Face
// 0 Name: s\6142617ss02.dat
// 0 Author: Massimo Maso [Sirio]
// 0 !LDRAW_ORG Subpart UPDATE 2023-05
// 0 !LICENSE Licensed under CC BY 4.0 : see CAreadme.txt
// 
// 0 BFC CERTIFY CCW
  [0,"BFC","CERTIFY"],
  [0,"BFC","CCW"],
// 
// 0 !HISTORY 2023-10-31 [OrionP] Official Update 2023-05
// 
// 
// 0 // Black faces
// 4 0 -3.5738 -.25 -3.798 -18 -.25 .0121 -18 -.25 -7.3435 -5.3378 -.25 -7.3435
  [4,0,-3.5738,-.25,-3.798,-18,-.25,.0121,-18,-.25,-7.3435,-5.3378,-.25,-7.3435],
// 3 0 -3.5738 -.25 -3.798 -2.75 -.25 .0121 -18 -.25 .0121
  [3,0,-3.5738,-.25,-3.798,-2.75,-.25,.0121,-18,-.25,.0121],
// 3 0 -3.5738 -.25 -3.798 -1.0028 -.25 .0121 -2.75 -.25 .0121
  [3,0,-3.5738,-.25,-3.798,-1.0028,-.25,.0121,-2.75,-.25,.0121],
// 4 0 -.2738 -.25 -3.798 .3262 -.25 -3.798 2.8972 -.25 .0121 2.2972 -.25 .0121
  [4,0,-.2738,-.25,-3.798,.3262,-.25,-3.798,2.8972,-.25,.0121,2.2972,-.25,.0121],
// 4 0 -.2738 -.25 -3.798 -2.0378 -.25 -7.3435 -1.4378 -.25 -7.3435 .3262 -.25 -3.798
  [4,0,-.2738,-.25,-3.798,-2.0378,-.25,-7.3435,-1.4378,-.25,-7.3435,.3262,-.25,-3.798],
// 4 0 4.6262 -.25 -3.798 5.2262 -.25 -3.798 7.7972 -.25 .0121 7.1972 -.25 .0121
  [4,0,4.6262,-.25,-3.798,5.2262,-.25,-3.798,7.7972,-.25,.0121,7.1972,-.25,.0121],
// 4 0 4.6262 -.25 -3.798 2.8622 -.25 -7.3435 3.4622 -.25 -7.3435 5.2262 -.25 -3.798
  [4,0,4.6262,-.25,-3.798,2.8622,-.25,-7.3435,3.4622,-.25,-7.3435,5.2262,-.25,-3.798],
// 4 0 9.5262 -.25 -3.798 10.1262 -.25 -3.798 12.6972 -.25 .0121 12.0972 -.25 .0121
  [4,0,9.5262,-.25,-3.798,10.1262,-.25,-3.798,12.6972,-.25,.0121,12.0972,-.25,.0121],
// 4 0 9.5262 -.25 -3.798 7.7622 -.25 -7.3435 8.3622 -.25 -7.3435 10.1262 -.25 -3.798
  [4,0,9.5262,-.25,-3.798,7.7622,-.25,-7.3435,8.3622,-.25,-7.3435,10.1262,-.25,-3.798],
// 4 0 11.9262 -.25 -3.798 18 -.25 -7.3435 18 -.25 .0121 14.4972 -.25 .0121
  [4,0,11.9262,-.25,-3.798,18,-.25,-7.3435,18,-.25,.0121,14.4972,-.25,.0121],
// 3 0 11.9262 -.25 -3.798 10.1622 -.25 -7.3435 18 -.25 -7.3435
  [3,0,11.9262,-.25,-3.798,10.1622,-.25,-7.3435,18,-.25,-7.3435],
// 0 // Dark grey faces
// 4 72 -3.5738 -.25 -3.798 -.2738 -.25 -3.798 2.2972 -.25 .0121 -1.0028 -.25 .0121
  [4,72,-3.5738,-.25,-3.798,-.2738,-.25,-3.798,2.2972,-.25,.0121,-1.0028,-.25,.0121],
// 4 72 -3.5738 -.25 -3.798 -5.3378 -.25 -7.3435 -2.0378 -.25 -7.3435 -.2738 -.25 -3.798
  [4,72,-3.5738,-.25,-3.798,-5.3378,-.25,-7.3435,-2.0378,-.25,-7.3435,-.2738,-.25,-3.798],
// 4 72 2.1262 -.25 -3.798 4.6262 -.25 -3.798 7.1972 -.25 .0121 4.6972 -.25 .0121
  [4,72,2.1262,-.25,-3.798,4.6262,-.25,-3.798,7.1972,-.25,.0121,4.6972,-.25,.0121],
// 4 72 2.1262 -.25 -3.798 .3622 -.25 -7.3435 2.8622 -.25 -7.3435 4.6262 -.25 -3.798
  [4,72,2.1262,-.25,-3.798,.3622,-.25,-7.3435,2.8622,-.25,-7.3435,4.6262,-.25,-3.798],
// 4 72 7.0262 -.25 -3.798 9.5262 -.25 -3.798 12.0972 -.25 .0121 9.5972 -.25 .0121
  [4,72,7.0262,-.25,-3.798,9.5262,-.25,-3.798,12.0972,-.25,.0121,9.5972,-.25,.0121],
// 4 72 7.0262 -.25 -3.798 5.2622 -.25 -7.3435 7.7622 -.25 -7.3435 9.5262 -.25 -3.798
  [4,72,7.0262,-.25,-3.798,5.2622,-.25,-7.3435,7.7622,-.25,-7.3435,9.5262,-.25,-3.798],
// 0 // Silver faces
// 4 80 .3262 -.25 -3.798 2.1262 -.25 -3.798 4.6972 -.25 .0121 2.8972 -.25 .0121
  [4,80,.3262,-.25,-3.798,2.1262,-.25,-3.798,4.6972,-.25,.0121,2.8972,-.25,.0121],
// 4 80 .3262 -.25 -3.798 -1.4378 -.25 -7.3435 .3622 -.25 -7.3435 2.1262 -.25 -3.798
  [4,80,.3262,-.25,-3.798,-1.4378,-.25,-7.3435,.3622,-.25,-7.3435,2.1262,-.25,-3.798],
// 4 80 5.2262 -.25 -3.798 7.0262 -.25 -3.798 9.5972 -.25 .0121 7.7972 -.25 .0121
  [4,80,5.2262,-.25,-3.798,7.0262,-.25,-3.798,9.5972,-.25,.0121,7.7972,-.25,.0121],
// 4 80 5.2262 -.25 -3.798 3.4622 -.25 -7.3435 5.2622 -.25 -7.3435 7.0262 -.25 -3.798
  [4,80,5.2262,-.25,-3.798,3.4622,-.25,-7.3435,5.2622,-.25,-7.3435,7.0262,-.25,-3.798],
// 4 80 10.1262 -.25 -3.798 11.9262 -.25 -3.798 14.4972 -.25 .0121 12.6972 -.25 .0121
  [4,80,10.1262,-.25,-3.798,11.9262,-.25,-3.798,14.4972,-.25,.0121,12.6972,-.25,.0121],
// 4 80 10.1262 -.25 -3.798 8.3622 -.25 -7.3435 10.1622 -.25 -7.3435 11.9262 -.25 -3.798
  [4,80,10.1262,-.25,-3.798,8.3622,-.25,-7.3435,10.1622,-.25,-7.3435,11.9262,-.25,-3.798],
];
module ldraw_lib__s__6142617ss02(step=0, col=false, unit=2/5, alt=false, line=0.2, solid=!$preview)
    makepoly(ldraw_lib__s__6142617ss02(), step=step, col=col, unit=unit, alt=alt, line=line, solid=solid);
ldraw_lib__s__6142617ss02(line=0.2);
// file: s/6142617ss01.scad
use <../../lib.scad>
use <../../p/1-4chrd.scad>
function ldraw_lib__s__6142617ss01() = [
// 0 ~Sticker  1.9 x  1.8 with Silver Air Vents on Black Background Left - First Face
// 0 Name: s\6142617ss01.dat
// 0 Author: Massimo Maso [Sirio]
// 0 !LDRAW_ORG Subpart UPDATE 2023-05
// 0 !LICENSE Licensed under CC BY 4.0 : see CAreadme.txt
// 
// 0 BFC CERTIFY CCW
  [0,"BFC","CERTIFY"],
  [0,"BFC","CCW"],
// 
// 0 !HISTORY 2023-10-31 [OrionP] Official Update 2023-05
// 
// 
// 0 // Primitives
// 1 0 -16.5 -.25 3.8922 -1.5 0 0 0 1 0 0 0 1.5 1-4chrd.dat
  [1,0,-16.5,-.25,3.8922,-1.5,0,0,0,1,0,0,0,1.5, ldraw_lib__1_4chrd()],
// 1 0 16.5 -.25 3.8922 1.5 0 0 0 1 0 0 0 1.5 1-4chrd.dat
  [1,0,16.5,-.25,3.8922,1.5,0,0,0,1,0,0,0,1.5, ldraw_lib__1_4chrd()],
// 0 // Black faces
// 4 0 -18 -.25 3.8922 18 -.25 3.8922 16.5 -.25 5.3922 -16.5 -.25 5.3922
  [4,0,-18,-.25,3.8922,18,-.25,3.8922,16.5,-.25,5.3922,-16.5,-.25,5.3922],
// 4 0 -18 -.25 3.8922 -18 -.25 -.0121 -2.75 -.25 -.0121 -2.75 -.25 .6211
  [4,0,-18,-.25,3.8922,-18,-.25,-.0121,-2.75,-.25,-.0121,-2.75,-.25,.6211],
// 4 0 18 -.25 3.8922 -18 -.25 3.8922 -2.75 -.25 .6211 15 -.25 .6211
  [4,0,18,-.25,3.8922,-18,-.25,3.8922,-2.75,-.25,.6211,15,-.25,.6211],
// 4 0 18 -.25 3.8922 15 -.25 .6211 14.4972 -.25 -.0121 18 -.25 -.0121
  [4,0,18,-.25,3.8922,15,-.25,.6211,14.4972,-.25,-.0121,18,-.25,-.0121],
// 0 // Silver faces
// 3 80 -2.75 -.25 .6211 -2.75 -.25 -.0121 -1.0028 -.25 -.0121
  [3,80,-2.75,-.25,.6211,-2.75,-.25,-.0121,-1.0028,-.25,-.0121],
// 3 80 -2.75 -.25 .6211 -1.0028 -.25 -.0121 2.2972 -.25 -.0121
  [3,80,-2.75,-.25,.6211,-1.0028,-.25,-.0121,2.2972,-.25,-.0121],
// 3 80 -2.75 -.25 .6211 2.2972 -.25 -.0121 2.8972 -.25 -.0121
  [3,80,-2.75,-.25,.6211,2.2972,-.25,-.0121,2.8972,-.25,-.0121],
// 3 80 -2.75 -.25 .6211 2.8972 -.25 -.0121 4.6972 -.25 -.0121
  [3,80,-2.75,-.25,.6211,2.8972,-.25,-.0121,4.6972,-.25,-.0121],
// 3 80 -2.75 -.25 .6211 4.6972 -.25 -.0121 7.1972 -.25 -.0121
  [3,80,-2.75,-.25,.6211,4.6972,-.25,-.0121,7.1972,-.25,-.0121],
// 4 80 -2.75 -.25 .6211 7.1972 -.25 -.0121 7.7972 -.25 -.0121 15 -.25 .6211
  [4,80,-2.75,-.25,.6211,7.1972,-.25,-.0121,7.7972,-.25,-.0121,15,-.25,.6211],
// 3 80 15 -.25 .6211 7.7972 -.25 -.0121 9.5972 -.25 -.0121
  [3,80,15,-.25,.6211,7.7972,-.25,-.0121,9.5972,-.25,-.0121],
// 3 80 15 -.25 .6211 9.5972 -.25 -.0121 12.0972 -.25 -.0121
  [3,80,15,-.25,.6211,9.5972,-.25,-.0121,12.0972,-.25,-.0121],
// 3 80 15 -.25 .6211 12.0972 -.25 -.0121 12.6972 -.25 -.0121
  [3,80,15,-.25,.6211,12.0972,-.25,-.0121,12.6972,-.25,-.0121],
// 3 80 15 -.25 .6211 12.6972 -.25 -.0121 14.4972 -.25 -.0121
  [3,80,15,-.25,.6211,12.6972,-.25,-.0121,14.4972,-.25,-.0121],
];
module ldraw_lib__s__6142617ss01(step=0, col=false, unit=2/5, alt=false, line=0.2, solid=!$preview)
    makepoly(ldraw_lib__s__6142617ss01(), step=step, col=col, unit=unit, alt=alt, line=line, solid=solid);
ldraw_lib__s__6142617ss01(line=0.2);
// file: 6142617s.scad
use <../lib.scad>
use <s/6142617ss01.scad>
use <s/6142617ss02.scad>
use <s/6142617ss03.scad>
use <s/6142617ss04.scad>
use <s/6142617ss05.scad>
use <s/6142617ss06.scad>
use <s/6142617ss07.scad>
function ldraw_lib__6142617s() = [
// 0 Sticker  1.9 x  1.8 with Silver Air Vents on Black Background Left (Needs work)
// 0 Name: 6142617s.dat
// 0 Author: Massimo Maso [Sirio]
// 0 !LDRAW_ORG Part UPDATE 2023-05
// 0 !LICENSE Licensed under CC BY 4.0 : see CAreadme.txt
// 
// 0 !HELP Needs work: Some parts should be halftones.
// 0 !HELP The transition from dark grey to grey should be done less clearly.
// 
// 0 BFC CERTIFY CCW
  [0,"BFC","CERTIFY"],
  [0,"BFC","CCW"],
// 
// 0 !KEYWORDS 1969, Camaro, Chevrolet, Drag, Race, Set 75874, Speed Champions
// 0 !KEYWORDS Z/28
// 
// 0 !HISTORY 2023-10-31 [OrionP] Official Update 2023-05
// 
// 
// 1 16 0 0 13.8789 1 0 0 0 1 0 0 0 1 s\6142617ss01.dat
  [1,16,0,0,13.8789,1,0,0,0,1,0,0,0,1, ldraw_lib__s__6142617ss01()],
// 1 16 0 0 13.8547 1 0 0 0 1 0 0 0 1 s\6142617ss02.dat
  [1,16,0,0,13.8547,1,0,0,0,1,0,0,0,1, ldraw_lib__s__6142617ss02()],
// 1 16 0 0 -.7172 1 0 0 0 1 0 0 0 1 s\6142617ss03.dat
  [1,16,0,0,-.7172,1,0,0,0,1,0,0,0,1, ldraw_lib__s__6142617ss03()],
// 1 16 0 0 -.7428 1 0 0 0 1 0 0 0 1 s\6142617ss04.dat
  [1,16,0,0,-.7428,1,0,0,0,1,0,0,0,1, ldraw_lib__s__6142617ss04()],
// 1 16 0 0 -14.6522 1 0 0 0 1 0 0 0 1 s\6142617ss05.dat
  [1,16,0,0,-14.6522,1,0,0,0,1,0,0,0,1, ldraw_lib__s__6142617ss05()],
// 1 16 0 0 -14.681 1 0 0 0 1 0 0 0 1 s\6142617ss06.dat
  [1,16,0,0,-14.681,1,0,0,0,1,0,0,0,1, ldraw_lib__s__6142617ss06()],
// 1 16 0 0 0 1 0 0 0 1 0 0 0 1 s\6142617ss07.dat
  [1,16,0,0,0,1,0,0,0,1,0,0,0,1, ldraw_lib__s__6142617ss07()],
];
module ldraw_lib__6142617s(step=0, col=false, unit=2/5, alt=false, line=0.2, solid=!$preview)
    makepoly(ldraw_lib__6142617s(), step=step, col=col, unit=unit, alt=alt, line=line, solid=solid);
ldraw_lib__6142617s(line=0.2);
// main file
use <../lib.scad>
use <6142617s.scad>
function ldraw_lib__6142617u() = [
// 0 Sticker  1.9 x  1.8 with Silver Air Vents on Black Background Right (Needs work)
// 0 Name: 6142617u.dat
// 0 Author: Massimo Maso [Sirio]
// 0 !LDRAW_ORG Part UPDATE 2023-05
// 0 !LICENSE Licensed under CC BY 4.0 : see CAreadme.txt
// 
// 0 !HELP Needs work: Some parts should be halftones.
// 0 !HELP The transition from dark grey to grey should be done less clearly.
// 
// 0 BFC CERTIFY CCW
  [0,"BFC","CERTIFY"],
  [0,"BFC","CCW"],
// 
// 0 !KEYWORDS 1969, Camaro, Chevrolet, Drag, Race, Set 75874, Speed Champions
// 0 !KEYWORDS Z/28
// 
// 0 !HISTORY 2023-10-31 [OrionP] Official Update 2023-05
// 
// 
// 1 16 0 0 0 -1 0 0 0 1 0 0 0 1 6142617s.dat
  [1,16,0,0,0,-1,0,0,0,1,0,0,0,1, ldraw_lib__6142617s()],
];
module ldraw_lib__6142617u(step=0, col=false, unit=2/5, alt=false, line=0.2, solid=!$preview)
    makepoly(ldraw_lib__6142617u(), step=step, col=col, unit=unit, alt=alt, line=line, solid=solid);
ldraw_lib__6142617u(line=0.2);
